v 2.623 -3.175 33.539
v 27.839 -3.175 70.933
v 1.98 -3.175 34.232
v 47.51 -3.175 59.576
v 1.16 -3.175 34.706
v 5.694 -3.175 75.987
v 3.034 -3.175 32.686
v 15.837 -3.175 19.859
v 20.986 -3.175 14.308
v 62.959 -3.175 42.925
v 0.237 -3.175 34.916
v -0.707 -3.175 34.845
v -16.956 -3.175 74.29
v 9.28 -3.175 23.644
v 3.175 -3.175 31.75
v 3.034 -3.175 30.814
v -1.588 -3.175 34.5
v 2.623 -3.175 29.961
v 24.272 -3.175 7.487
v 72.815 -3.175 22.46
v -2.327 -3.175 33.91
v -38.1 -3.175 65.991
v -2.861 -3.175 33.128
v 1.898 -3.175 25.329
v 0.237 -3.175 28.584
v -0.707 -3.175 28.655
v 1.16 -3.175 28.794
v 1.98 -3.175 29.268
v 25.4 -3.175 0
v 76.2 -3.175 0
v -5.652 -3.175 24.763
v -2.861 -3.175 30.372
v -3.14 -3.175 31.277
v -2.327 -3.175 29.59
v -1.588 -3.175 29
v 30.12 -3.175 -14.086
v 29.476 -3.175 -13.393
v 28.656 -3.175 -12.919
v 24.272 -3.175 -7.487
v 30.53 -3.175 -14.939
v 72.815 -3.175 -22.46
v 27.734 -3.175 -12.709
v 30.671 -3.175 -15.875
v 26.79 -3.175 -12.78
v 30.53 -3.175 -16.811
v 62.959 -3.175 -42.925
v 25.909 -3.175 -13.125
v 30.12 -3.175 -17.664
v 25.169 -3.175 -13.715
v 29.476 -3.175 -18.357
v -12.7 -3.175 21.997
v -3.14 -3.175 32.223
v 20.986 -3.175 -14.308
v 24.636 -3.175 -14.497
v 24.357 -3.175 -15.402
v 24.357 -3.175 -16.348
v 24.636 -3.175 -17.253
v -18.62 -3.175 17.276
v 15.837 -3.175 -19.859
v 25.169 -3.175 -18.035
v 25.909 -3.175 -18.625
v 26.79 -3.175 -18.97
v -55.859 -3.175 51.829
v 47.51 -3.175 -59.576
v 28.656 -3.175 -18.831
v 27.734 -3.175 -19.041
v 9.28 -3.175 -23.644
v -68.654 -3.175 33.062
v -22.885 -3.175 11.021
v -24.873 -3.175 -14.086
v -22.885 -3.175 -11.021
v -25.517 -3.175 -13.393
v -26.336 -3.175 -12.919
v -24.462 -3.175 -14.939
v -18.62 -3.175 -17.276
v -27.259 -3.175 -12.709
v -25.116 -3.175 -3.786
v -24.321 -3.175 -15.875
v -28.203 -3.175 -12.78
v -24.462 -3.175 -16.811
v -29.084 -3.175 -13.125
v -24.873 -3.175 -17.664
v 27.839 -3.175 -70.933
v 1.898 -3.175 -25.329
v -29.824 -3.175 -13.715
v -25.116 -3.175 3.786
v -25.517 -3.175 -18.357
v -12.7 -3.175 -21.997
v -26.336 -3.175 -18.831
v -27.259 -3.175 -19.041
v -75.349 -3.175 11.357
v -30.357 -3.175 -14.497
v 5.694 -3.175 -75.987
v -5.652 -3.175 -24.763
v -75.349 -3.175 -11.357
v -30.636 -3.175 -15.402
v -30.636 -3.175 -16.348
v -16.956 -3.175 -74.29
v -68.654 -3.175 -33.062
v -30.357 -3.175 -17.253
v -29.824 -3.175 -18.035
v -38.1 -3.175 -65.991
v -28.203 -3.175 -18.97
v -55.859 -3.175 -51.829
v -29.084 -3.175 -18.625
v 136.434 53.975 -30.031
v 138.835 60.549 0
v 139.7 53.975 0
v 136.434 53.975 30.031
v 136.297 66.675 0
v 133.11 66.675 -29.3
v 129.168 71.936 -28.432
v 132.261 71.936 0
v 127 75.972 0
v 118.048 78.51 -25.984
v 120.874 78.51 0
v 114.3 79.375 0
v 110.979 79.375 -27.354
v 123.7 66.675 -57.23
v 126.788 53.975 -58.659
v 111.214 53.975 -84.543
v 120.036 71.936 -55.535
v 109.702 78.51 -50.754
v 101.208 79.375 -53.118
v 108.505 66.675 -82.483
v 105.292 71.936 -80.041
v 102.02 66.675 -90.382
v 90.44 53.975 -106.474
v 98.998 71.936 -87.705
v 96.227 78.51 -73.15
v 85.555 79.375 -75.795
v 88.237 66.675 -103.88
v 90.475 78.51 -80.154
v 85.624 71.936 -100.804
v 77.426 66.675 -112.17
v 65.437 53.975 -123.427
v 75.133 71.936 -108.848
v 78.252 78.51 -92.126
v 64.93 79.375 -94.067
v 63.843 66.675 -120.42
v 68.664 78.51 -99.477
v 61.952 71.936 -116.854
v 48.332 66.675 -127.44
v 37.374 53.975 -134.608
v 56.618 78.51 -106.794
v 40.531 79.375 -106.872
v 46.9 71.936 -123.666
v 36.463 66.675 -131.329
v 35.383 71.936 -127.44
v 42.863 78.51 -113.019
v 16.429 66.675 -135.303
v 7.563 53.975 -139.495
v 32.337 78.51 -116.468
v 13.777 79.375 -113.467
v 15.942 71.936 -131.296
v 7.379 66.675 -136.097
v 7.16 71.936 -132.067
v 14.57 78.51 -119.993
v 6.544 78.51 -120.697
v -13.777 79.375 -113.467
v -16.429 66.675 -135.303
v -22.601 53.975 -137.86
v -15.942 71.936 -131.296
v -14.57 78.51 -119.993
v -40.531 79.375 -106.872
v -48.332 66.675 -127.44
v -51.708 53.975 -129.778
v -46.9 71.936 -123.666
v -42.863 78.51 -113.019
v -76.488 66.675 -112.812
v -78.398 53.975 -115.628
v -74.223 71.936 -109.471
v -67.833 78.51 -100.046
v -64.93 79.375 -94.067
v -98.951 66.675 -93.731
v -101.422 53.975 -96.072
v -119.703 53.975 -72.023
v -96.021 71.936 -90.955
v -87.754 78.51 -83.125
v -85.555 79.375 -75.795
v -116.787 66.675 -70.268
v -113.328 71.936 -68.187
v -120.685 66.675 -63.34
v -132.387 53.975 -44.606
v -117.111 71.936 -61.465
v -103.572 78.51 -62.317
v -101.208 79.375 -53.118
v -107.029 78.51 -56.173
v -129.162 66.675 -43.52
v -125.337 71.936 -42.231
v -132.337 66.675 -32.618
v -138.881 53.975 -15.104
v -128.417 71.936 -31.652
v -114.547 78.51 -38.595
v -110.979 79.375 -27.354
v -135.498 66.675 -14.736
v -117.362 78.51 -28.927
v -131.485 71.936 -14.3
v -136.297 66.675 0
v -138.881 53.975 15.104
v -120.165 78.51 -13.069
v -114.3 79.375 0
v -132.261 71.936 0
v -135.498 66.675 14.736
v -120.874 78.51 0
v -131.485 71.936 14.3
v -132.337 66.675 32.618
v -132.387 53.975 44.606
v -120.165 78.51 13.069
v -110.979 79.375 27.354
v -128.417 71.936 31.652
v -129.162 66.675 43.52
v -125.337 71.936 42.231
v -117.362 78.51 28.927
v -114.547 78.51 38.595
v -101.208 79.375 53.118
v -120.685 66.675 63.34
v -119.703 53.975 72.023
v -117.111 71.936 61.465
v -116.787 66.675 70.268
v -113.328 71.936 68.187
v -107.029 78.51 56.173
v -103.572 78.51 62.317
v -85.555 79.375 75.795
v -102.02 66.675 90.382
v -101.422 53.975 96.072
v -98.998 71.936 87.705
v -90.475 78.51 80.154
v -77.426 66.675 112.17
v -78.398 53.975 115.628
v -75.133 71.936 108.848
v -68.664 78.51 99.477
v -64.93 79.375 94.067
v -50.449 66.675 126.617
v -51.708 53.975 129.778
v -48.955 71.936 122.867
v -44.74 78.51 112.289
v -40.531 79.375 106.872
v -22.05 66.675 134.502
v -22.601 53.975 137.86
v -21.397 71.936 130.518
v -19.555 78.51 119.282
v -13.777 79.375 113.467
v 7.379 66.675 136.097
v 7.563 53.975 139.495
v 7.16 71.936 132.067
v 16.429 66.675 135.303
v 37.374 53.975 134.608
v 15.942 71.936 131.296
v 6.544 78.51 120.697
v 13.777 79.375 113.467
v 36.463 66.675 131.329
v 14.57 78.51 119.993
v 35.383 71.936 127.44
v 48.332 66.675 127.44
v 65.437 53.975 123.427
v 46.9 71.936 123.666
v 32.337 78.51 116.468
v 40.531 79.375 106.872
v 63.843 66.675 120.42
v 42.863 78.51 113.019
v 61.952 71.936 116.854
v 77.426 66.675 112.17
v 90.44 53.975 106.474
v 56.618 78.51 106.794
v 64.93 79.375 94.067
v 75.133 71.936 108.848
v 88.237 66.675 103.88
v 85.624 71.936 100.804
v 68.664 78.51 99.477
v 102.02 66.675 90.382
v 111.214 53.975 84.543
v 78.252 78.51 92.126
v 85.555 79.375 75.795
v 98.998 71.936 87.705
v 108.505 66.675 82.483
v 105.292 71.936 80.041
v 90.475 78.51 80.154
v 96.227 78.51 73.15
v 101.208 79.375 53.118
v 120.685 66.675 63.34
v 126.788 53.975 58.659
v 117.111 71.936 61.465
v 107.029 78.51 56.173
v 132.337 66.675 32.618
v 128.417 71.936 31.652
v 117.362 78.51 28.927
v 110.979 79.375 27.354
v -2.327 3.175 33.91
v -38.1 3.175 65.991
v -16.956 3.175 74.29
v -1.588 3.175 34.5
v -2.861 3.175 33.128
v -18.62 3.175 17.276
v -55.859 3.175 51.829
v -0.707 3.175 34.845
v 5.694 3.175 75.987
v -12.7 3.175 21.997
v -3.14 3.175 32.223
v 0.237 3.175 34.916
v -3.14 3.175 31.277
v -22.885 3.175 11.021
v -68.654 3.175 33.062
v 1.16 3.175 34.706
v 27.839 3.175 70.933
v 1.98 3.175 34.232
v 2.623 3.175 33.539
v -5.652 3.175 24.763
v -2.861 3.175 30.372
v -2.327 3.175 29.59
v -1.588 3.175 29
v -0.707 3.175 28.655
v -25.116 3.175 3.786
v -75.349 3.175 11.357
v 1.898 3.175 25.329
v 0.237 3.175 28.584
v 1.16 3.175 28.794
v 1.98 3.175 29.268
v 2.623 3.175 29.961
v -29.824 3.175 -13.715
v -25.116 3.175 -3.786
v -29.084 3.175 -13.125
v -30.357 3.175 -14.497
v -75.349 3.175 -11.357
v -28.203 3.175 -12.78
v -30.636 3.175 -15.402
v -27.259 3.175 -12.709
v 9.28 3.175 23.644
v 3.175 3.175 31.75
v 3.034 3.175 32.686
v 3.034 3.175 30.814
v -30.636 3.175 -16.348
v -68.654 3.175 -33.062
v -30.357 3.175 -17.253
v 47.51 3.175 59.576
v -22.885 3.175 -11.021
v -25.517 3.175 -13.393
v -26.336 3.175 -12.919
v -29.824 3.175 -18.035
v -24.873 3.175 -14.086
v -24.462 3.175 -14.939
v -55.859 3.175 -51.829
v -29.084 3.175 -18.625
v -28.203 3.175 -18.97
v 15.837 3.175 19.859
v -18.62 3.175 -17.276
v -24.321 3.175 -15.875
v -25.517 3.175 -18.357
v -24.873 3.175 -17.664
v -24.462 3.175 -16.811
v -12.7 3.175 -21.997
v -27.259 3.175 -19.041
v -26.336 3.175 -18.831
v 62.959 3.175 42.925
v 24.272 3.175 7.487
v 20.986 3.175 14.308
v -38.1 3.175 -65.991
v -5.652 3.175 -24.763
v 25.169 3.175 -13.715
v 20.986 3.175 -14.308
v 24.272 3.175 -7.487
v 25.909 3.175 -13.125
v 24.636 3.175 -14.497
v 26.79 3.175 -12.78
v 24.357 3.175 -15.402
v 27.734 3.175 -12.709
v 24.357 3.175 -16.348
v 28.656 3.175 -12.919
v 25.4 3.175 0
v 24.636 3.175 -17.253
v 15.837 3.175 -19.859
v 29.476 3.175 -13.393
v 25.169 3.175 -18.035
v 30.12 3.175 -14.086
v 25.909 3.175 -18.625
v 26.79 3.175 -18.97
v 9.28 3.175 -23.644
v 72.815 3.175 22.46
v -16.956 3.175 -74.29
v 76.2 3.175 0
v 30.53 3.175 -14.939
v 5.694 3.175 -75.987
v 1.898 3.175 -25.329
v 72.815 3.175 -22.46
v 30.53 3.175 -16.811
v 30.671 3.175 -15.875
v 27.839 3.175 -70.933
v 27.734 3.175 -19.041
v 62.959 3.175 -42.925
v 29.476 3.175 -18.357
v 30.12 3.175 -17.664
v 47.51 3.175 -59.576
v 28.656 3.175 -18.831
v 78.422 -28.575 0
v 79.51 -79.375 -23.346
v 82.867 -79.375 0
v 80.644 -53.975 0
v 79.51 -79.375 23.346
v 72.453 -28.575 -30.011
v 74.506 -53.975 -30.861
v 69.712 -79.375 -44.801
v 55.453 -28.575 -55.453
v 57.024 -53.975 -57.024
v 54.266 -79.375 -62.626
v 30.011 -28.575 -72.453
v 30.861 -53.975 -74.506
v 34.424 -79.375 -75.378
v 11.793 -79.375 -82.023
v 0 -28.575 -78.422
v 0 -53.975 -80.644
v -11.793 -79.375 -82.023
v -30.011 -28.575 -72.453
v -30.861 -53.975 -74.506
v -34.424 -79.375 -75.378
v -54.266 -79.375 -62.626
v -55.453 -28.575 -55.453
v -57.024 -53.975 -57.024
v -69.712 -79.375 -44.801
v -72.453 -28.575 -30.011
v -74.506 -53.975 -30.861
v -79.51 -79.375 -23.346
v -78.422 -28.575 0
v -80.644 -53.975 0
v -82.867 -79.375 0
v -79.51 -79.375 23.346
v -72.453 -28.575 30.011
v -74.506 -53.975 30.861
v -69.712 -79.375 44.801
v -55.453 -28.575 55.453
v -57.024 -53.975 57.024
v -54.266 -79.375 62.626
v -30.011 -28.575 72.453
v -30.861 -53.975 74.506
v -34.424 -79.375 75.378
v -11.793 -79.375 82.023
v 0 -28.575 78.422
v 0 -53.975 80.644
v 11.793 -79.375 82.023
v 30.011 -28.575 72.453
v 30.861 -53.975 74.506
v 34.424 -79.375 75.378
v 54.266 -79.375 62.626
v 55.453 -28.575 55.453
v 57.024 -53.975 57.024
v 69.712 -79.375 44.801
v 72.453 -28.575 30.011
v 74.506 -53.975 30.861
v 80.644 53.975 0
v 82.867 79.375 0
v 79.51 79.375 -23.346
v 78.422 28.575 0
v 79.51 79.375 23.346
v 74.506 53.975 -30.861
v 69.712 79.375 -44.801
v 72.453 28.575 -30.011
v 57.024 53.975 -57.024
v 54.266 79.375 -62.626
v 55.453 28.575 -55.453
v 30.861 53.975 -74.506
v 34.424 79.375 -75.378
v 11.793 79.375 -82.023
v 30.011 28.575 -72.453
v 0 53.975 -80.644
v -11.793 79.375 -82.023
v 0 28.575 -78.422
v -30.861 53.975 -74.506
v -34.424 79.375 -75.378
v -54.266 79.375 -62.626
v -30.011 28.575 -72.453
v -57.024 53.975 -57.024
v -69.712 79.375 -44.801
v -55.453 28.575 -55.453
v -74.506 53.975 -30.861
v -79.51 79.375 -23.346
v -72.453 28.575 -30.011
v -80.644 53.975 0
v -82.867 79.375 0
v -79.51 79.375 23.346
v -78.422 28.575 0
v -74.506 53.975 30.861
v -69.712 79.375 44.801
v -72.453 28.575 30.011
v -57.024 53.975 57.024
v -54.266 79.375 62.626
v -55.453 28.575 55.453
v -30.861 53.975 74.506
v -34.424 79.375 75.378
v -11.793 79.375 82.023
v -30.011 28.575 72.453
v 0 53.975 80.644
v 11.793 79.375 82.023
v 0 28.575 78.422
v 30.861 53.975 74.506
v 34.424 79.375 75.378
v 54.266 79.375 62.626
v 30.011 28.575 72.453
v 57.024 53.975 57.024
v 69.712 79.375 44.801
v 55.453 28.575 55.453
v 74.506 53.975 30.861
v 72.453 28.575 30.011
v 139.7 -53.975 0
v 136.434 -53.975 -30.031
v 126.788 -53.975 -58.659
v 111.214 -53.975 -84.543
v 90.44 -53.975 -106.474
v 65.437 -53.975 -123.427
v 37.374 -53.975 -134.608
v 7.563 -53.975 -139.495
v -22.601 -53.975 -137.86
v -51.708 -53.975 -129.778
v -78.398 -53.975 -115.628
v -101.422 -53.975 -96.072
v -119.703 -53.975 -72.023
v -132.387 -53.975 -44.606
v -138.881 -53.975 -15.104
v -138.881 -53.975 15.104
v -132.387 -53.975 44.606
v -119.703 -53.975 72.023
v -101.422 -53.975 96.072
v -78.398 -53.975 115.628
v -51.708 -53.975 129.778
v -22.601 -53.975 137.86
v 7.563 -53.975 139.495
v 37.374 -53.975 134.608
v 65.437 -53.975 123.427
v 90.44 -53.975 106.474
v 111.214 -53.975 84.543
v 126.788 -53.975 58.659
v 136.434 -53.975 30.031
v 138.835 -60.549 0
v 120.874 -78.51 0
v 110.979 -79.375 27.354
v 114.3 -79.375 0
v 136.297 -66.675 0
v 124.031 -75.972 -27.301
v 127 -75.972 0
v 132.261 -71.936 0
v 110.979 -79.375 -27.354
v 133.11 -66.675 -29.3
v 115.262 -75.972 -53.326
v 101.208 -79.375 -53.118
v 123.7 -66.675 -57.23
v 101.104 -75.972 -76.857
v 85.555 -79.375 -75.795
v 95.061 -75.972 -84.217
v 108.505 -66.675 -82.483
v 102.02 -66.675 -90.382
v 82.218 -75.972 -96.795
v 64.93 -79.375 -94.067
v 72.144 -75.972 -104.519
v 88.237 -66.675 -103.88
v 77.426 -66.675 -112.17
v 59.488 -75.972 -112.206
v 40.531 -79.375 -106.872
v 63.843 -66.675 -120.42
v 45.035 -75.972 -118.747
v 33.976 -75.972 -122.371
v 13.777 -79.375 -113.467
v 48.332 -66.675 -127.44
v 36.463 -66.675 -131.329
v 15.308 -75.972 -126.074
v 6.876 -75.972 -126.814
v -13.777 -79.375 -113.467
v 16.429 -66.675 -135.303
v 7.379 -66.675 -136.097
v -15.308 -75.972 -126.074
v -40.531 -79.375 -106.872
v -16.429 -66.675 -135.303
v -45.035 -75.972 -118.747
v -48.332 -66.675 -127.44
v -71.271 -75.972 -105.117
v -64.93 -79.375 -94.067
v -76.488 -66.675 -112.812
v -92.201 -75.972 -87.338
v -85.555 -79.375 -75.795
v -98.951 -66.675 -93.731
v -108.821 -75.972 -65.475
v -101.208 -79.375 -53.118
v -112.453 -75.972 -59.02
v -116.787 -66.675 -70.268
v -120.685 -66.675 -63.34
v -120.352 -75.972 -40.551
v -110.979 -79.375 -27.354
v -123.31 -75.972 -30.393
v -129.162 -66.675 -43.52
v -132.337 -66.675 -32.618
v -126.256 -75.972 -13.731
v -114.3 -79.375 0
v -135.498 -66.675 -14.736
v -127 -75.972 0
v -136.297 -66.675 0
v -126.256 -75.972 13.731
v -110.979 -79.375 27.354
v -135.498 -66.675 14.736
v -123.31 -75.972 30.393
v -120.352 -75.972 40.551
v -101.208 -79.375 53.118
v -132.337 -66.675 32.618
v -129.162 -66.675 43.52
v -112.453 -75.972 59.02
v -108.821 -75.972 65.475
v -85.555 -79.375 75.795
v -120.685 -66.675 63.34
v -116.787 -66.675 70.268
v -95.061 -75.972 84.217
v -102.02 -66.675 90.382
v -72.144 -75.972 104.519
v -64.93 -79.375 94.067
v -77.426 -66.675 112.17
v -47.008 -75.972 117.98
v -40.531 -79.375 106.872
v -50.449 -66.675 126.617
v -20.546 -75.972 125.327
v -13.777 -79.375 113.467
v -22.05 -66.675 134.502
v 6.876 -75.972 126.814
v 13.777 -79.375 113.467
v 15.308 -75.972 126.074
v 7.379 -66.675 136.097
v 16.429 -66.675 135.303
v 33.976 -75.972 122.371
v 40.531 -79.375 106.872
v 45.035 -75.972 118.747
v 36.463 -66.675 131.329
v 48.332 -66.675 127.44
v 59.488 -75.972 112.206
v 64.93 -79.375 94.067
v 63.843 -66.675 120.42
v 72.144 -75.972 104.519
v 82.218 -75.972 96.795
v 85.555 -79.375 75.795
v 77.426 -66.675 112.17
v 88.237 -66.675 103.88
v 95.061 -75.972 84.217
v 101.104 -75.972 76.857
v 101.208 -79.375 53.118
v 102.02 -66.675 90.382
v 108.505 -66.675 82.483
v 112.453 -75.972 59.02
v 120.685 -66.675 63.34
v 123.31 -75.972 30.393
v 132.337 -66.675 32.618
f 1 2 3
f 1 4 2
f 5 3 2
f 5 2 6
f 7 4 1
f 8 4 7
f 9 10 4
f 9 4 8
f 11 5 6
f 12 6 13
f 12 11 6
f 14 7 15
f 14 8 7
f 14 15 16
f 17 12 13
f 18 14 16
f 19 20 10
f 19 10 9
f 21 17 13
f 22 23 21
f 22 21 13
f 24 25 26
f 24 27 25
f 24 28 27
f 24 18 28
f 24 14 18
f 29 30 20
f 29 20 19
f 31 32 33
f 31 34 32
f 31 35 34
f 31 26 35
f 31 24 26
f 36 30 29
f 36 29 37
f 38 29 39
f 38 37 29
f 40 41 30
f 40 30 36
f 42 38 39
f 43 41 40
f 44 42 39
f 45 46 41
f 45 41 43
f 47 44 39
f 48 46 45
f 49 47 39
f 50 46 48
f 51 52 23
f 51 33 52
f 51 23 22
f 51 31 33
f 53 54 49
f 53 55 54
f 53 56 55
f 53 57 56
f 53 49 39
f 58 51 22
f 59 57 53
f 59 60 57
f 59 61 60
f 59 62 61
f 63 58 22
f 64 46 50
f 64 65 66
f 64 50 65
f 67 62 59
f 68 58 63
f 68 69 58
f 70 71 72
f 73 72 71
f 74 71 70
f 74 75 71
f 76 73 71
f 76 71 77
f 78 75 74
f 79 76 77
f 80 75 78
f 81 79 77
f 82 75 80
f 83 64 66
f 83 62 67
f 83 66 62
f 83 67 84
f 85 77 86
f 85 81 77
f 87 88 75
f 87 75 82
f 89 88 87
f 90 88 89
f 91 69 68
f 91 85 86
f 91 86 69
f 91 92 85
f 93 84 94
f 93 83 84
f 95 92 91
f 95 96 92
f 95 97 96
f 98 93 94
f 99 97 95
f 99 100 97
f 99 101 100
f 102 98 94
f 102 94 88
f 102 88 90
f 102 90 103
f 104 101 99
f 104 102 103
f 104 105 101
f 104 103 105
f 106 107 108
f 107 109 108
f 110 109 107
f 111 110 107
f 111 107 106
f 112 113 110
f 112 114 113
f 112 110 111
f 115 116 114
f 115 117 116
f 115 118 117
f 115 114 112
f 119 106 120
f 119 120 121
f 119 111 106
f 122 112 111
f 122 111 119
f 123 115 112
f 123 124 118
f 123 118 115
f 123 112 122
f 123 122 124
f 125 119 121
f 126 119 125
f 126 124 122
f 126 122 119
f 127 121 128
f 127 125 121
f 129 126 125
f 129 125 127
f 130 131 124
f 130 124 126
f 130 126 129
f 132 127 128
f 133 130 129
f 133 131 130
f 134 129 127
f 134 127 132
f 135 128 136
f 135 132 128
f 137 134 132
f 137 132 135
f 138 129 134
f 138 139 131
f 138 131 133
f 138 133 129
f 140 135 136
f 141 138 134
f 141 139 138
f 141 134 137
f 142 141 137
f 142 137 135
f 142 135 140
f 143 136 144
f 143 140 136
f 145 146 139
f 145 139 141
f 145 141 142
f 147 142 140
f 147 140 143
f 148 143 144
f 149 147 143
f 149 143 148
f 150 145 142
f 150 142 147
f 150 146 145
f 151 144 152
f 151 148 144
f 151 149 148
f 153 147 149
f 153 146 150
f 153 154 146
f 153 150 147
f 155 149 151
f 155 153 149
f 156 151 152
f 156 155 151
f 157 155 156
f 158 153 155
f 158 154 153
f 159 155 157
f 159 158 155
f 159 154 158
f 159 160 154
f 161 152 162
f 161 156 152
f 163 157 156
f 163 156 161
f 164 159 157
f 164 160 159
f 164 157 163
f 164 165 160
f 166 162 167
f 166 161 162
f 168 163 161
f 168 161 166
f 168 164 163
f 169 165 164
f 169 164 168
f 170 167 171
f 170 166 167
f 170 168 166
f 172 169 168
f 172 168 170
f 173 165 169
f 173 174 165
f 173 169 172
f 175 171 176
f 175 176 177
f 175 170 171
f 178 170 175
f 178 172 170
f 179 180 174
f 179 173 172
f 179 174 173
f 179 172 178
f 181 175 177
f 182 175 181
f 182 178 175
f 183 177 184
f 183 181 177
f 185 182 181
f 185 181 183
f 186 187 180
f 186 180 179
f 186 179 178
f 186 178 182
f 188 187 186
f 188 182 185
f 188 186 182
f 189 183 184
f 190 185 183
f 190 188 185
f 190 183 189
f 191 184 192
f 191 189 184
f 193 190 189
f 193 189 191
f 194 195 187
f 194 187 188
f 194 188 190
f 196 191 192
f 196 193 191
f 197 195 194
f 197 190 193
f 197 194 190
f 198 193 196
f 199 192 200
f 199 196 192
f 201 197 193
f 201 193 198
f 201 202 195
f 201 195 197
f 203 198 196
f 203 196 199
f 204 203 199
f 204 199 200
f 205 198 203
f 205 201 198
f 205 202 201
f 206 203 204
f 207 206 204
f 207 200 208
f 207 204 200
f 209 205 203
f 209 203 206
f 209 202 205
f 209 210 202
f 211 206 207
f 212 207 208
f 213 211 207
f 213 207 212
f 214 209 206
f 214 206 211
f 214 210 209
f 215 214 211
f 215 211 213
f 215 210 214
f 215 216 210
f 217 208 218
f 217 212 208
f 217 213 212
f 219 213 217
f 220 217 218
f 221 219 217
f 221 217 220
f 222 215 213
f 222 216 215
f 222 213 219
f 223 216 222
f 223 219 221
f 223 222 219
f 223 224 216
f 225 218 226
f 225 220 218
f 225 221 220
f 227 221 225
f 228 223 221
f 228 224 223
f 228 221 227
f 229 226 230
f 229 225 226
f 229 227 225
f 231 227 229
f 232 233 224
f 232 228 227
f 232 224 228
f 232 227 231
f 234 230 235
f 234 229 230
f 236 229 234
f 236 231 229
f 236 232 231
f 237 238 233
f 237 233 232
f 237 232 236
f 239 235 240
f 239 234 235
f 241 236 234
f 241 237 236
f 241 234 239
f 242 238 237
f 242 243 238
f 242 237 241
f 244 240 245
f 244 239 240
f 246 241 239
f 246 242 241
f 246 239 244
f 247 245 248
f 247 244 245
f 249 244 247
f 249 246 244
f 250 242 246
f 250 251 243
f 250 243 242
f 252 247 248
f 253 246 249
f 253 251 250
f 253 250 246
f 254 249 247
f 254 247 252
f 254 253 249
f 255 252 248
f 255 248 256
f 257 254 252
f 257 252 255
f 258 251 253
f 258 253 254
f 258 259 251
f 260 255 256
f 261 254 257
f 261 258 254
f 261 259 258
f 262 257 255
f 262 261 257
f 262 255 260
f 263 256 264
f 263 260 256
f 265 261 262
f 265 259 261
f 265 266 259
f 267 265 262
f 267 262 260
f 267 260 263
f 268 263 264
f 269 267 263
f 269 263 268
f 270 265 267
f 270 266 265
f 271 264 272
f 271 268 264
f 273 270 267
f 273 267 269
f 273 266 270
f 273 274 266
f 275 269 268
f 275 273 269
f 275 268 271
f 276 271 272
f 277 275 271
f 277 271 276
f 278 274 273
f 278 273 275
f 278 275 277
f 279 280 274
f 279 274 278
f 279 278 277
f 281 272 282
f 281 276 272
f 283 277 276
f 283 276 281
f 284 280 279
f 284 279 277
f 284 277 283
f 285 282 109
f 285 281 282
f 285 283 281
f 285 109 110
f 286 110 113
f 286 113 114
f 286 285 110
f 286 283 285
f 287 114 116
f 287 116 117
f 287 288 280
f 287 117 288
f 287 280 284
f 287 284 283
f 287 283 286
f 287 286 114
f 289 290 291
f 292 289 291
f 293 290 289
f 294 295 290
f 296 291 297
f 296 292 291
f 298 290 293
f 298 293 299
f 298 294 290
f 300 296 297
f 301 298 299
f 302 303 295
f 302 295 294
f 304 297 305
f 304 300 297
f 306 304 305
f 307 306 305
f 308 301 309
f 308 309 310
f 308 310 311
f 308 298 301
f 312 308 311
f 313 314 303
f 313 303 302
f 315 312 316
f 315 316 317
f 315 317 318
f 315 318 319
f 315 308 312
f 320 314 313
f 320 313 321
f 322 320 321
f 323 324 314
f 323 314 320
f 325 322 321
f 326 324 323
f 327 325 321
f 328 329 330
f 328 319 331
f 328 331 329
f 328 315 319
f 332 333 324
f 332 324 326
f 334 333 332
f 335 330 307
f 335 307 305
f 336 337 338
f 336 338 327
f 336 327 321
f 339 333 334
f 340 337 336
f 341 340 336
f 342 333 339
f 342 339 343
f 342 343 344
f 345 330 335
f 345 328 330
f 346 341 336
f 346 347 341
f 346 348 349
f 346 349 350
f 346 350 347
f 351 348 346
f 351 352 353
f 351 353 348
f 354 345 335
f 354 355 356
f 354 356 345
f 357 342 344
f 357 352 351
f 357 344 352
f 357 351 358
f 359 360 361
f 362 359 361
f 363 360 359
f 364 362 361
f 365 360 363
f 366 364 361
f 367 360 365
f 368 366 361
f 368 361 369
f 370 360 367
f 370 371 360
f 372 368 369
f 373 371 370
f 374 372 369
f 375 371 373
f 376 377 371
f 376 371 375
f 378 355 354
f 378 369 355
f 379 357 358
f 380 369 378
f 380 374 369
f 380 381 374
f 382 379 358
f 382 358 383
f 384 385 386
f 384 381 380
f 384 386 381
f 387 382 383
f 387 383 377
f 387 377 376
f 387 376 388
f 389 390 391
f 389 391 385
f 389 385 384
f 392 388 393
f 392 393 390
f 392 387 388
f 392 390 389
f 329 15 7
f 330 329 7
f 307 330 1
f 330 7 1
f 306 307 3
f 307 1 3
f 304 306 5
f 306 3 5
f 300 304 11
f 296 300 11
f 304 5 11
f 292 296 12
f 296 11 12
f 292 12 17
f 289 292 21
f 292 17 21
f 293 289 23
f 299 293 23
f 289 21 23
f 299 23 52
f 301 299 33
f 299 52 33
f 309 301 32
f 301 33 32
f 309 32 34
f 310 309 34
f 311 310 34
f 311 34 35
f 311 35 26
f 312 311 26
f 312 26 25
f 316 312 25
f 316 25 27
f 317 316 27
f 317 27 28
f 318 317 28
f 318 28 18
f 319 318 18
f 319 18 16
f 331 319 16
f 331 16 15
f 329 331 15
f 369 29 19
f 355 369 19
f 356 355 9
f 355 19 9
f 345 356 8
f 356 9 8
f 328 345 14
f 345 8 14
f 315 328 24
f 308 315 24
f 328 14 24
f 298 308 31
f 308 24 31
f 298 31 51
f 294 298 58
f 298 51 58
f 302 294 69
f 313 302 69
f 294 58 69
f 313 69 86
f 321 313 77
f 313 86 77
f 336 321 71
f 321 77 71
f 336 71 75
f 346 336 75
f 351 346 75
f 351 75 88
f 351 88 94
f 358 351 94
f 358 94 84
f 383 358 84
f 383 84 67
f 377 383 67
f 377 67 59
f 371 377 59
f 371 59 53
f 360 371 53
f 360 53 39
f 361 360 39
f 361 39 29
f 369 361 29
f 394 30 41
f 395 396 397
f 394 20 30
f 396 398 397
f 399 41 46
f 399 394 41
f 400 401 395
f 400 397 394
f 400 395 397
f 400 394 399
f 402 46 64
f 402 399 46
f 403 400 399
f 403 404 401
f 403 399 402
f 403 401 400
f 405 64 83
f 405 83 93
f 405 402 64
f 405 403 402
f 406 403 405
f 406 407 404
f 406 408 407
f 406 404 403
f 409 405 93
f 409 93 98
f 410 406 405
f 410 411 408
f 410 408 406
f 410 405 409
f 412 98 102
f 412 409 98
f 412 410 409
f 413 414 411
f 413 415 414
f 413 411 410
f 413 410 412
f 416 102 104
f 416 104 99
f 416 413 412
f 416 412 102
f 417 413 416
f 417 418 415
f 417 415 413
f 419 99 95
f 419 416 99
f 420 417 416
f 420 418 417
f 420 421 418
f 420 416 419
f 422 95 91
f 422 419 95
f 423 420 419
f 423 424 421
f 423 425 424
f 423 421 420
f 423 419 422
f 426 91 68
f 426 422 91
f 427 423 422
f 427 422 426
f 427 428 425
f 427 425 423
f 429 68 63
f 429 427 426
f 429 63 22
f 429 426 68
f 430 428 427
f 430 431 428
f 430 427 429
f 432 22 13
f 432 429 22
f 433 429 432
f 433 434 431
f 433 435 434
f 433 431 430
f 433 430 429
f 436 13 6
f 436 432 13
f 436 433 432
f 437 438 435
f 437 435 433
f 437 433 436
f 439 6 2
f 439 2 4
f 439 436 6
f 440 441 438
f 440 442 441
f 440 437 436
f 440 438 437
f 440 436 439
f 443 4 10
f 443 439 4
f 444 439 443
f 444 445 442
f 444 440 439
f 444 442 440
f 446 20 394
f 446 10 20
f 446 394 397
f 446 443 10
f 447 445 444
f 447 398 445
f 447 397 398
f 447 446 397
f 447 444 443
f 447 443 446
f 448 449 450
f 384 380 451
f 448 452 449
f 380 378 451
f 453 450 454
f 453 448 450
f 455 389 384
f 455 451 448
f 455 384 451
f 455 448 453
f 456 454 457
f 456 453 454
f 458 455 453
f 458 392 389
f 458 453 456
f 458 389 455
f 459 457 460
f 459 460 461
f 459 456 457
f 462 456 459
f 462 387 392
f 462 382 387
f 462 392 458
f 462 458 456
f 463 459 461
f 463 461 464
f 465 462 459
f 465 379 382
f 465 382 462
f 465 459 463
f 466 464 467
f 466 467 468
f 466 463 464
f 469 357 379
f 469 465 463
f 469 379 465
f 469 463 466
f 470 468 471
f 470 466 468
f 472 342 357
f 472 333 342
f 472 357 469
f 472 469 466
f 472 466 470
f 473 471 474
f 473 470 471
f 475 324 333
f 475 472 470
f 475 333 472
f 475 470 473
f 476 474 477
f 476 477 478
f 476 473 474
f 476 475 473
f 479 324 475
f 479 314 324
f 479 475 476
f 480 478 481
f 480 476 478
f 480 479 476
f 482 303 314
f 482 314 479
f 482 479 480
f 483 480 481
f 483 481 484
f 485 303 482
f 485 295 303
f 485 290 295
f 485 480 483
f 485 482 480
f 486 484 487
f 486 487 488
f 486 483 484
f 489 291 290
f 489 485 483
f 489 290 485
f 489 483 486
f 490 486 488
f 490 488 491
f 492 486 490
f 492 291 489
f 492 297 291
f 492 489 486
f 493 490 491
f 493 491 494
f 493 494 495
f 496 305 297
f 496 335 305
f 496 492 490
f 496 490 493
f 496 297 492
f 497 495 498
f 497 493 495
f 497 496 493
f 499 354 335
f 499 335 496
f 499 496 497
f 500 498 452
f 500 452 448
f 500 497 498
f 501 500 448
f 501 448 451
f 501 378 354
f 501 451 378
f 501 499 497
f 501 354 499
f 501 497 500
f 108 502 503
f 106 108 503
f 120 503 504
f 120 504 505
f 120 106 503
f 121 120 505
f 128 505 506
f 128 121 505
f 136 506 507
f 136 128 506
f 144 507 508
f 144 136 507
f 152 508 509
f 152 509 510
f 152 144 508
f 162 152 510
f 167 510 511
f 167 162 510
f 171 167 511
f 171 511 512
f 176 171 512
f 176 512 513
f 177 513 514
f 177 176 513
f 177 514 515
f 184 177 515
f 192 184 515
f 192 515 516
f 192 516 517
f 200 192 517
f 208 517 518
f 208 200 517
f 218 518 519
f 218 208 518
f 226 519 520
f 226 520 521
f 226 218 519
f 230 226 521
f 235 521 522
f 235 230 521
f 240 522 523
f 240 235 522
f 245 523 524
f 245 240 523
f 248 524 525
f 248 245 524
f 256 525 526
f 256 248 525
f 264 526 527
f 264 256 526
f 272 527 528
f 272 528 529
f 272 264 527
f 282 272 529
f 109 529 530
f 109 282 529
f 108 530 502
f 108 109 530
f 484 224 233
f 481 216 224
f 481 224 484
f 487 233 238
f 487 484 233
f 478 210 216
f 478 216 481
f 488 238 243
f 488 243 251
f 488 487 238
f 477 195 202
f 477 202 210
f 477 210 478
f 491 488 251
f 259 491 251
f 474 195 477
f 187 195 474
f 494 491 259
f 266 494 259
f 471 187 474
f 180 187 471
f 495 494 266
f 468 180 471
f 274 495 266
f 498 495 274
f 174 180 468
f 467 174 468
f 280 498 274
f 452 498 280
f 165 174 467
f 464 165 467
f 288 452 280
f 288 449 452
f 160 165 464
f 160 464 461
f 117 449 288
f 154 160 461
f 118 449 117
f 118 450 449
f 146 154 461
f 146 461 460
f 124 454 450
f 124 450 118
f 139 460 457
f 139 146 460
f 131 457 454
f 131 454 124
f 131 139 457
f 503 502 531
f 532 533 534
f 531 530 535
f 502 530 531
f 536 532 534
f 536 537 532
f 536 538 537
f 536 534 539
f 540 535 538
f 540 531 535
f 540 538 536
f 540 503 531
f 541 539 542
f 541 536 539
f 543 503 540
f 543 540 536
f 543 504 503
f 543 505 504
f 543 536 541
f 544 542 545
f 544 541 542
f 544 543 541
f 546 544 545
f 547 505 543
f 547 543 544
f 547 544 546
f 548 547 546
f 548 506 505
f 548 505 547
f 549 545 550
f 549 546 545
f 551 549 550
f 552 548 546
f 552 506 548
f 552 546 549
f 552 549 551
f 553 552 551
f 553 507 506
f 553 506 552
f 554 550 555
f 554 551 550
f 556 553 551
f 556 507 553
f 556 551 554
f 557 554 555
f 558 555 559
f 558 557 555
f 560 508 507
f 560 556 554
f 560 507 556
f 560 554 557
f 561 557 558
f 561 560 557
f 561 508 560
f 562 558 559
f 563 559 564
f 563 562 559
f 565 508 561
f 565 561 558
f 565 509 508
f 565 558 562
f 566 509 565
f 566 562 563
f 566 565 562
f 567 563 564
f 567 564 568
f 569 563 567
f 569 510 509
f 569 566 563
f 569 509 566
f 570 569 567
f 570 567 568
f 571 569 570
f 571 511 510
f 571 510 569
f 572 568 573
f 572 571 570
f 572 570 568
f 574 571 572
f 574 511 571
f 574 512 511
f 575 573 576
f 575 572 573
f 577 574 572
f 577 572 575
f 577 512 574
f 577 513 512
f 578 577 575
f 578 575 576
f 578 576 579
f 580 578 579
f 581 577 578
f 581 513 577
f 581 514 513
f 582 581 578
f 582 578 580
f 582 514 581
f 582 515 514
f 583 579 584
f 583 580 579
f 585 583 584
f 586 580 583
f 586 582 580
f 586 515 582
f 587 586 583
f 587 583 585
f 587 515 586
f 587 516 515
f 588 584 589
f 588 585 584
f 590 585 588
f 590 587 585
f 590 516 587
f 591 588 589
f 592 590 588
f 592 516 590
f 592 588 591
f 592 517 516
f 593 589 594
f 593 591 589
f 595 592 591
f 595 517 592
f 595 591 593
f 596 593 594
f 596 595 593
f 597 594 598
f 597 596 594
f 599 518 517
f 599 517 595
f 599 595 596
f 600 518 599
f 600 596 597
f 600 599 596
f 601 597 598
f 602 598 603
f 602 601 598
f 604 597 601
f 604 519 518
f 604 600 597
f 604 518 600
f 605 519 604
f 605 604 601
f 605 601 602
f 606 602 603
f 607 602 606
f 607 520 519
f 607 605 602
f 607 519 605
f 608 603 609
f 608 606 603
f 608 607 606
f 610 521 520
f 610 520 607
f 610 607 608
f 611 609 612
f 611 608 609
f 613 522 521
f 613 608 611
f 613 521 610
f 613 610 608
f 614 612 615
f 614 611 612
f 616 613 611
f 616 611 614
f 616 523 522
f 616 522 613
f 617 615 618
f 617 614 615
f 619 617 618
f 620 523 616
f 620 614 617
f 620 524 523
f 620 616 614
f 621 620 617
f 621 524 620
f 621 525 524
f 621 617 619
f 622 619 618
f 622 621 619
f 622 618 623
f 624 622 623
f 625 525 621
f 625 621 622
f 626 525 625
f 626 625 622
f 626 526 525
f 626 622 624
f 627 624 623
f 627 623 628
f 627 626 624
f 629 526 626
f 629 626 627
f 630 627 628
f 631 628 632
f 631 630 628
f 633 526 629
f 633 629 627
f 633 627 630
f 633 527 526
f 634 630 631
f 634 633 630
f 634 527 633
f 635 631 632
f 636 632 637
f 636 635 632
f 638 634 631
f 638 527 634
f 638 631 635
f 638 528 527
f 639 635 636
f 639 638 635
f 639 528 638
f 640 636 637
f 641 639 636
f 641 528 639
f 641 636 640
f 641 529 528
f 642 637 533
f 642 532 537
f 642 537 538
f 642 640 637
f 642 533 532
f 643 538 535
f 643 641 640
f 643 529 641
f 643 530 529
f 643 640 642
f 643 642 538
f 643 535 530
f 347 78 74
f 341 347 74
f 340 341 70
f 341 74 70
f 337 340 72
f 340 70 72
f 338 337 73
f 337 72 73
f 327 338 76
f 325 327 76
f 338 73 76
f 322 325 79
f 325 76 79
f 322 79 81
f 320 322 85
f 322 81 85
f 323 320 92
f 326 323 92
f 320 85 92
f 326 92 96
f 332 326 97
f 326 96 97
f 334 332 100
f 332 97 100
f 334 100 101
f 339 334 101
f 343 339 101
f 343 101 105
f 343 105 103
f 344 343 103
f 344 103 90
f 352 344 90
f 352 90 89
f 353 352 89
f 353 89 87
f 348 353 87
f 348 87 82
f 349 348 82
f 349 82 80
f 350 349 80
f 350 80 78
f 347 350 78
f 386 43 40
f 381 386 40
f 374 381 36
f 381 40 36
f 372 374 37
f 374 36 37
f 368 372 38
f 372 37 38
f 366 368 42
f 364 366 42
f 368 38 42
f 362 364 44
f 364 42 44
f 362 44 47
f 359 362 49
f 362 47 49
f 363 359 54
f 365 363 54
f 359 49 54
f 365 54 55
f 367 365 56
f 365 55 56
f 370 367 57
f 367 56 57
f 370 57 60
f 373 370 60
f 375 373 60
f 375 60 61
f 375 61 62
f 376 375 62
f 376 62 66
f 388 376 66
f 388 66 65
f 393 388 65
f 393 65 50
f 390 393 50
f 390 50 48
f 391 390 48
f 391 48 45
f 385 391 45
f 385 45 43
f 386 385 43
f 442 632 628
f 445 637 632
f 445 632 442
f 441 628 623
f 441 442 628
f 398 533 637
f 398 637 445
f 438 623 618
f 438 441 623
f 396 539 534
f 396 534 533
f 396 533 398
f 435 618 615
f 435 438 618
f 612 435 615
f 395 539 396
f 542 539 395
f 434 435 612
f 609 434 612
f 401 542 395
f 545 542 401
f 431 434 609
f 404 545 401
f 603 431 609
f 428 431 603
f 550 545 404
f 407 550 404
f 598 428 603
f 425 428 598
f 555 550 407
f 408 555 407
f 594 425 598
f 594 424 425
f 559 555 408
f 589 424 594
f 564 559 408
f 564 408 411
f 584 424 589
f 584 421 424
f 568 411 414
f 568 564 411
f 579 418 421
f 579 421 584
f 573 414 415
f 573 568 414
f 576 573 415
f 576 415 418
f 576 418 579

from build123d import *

# Parameters (mm, degrees)
F2_R     = 25.4
F3_R     = 25.4
F3_R_2   = 3.175
F4_DEPTH = 82.551


with BuildPart() as f1:
    # F0 (on Top) → F1 (revolve)
    with BuildSketch(Plane.XY):
        Polygon((0, 3.175), (0, 0), (0, -3.175), (76.2, -3.175), (82.866636, -79.375), (139.7, -79.375), (139.7, 0), (139.7, 79.375), (82.866636, 79.375), (76.2, 3.175), align=None)
    revolve(axis=Axis((0, 1.5875, 0), (0, 1, 0)))

    # F2
    f2_edges = [f1.edges().sort_by_distance(p)[0] for p in [
        (-139.7, -79.375, 0),
        (-139.7, 79.375, 0),
    ]]
    fillet(f2_edges, radius=F2_R)

    # F3 (on face) → F4 (cut, through all)
    with BuildSketch(Plane.XZ.offset(3.175)):
        Circle(F3_R)
        with Locations((0, 31.75)):
            Circle(F3_R_2)
        with Locations((-27.496307, -15.875)):
            Circle(F3_R_2)
        with Locations((27.496307, -15.875)):
            Circle(F3_R_2)
    extrude(amount=-F4_DEPTH, mode=Mode.SUBTRACT)


solid = f1.part
